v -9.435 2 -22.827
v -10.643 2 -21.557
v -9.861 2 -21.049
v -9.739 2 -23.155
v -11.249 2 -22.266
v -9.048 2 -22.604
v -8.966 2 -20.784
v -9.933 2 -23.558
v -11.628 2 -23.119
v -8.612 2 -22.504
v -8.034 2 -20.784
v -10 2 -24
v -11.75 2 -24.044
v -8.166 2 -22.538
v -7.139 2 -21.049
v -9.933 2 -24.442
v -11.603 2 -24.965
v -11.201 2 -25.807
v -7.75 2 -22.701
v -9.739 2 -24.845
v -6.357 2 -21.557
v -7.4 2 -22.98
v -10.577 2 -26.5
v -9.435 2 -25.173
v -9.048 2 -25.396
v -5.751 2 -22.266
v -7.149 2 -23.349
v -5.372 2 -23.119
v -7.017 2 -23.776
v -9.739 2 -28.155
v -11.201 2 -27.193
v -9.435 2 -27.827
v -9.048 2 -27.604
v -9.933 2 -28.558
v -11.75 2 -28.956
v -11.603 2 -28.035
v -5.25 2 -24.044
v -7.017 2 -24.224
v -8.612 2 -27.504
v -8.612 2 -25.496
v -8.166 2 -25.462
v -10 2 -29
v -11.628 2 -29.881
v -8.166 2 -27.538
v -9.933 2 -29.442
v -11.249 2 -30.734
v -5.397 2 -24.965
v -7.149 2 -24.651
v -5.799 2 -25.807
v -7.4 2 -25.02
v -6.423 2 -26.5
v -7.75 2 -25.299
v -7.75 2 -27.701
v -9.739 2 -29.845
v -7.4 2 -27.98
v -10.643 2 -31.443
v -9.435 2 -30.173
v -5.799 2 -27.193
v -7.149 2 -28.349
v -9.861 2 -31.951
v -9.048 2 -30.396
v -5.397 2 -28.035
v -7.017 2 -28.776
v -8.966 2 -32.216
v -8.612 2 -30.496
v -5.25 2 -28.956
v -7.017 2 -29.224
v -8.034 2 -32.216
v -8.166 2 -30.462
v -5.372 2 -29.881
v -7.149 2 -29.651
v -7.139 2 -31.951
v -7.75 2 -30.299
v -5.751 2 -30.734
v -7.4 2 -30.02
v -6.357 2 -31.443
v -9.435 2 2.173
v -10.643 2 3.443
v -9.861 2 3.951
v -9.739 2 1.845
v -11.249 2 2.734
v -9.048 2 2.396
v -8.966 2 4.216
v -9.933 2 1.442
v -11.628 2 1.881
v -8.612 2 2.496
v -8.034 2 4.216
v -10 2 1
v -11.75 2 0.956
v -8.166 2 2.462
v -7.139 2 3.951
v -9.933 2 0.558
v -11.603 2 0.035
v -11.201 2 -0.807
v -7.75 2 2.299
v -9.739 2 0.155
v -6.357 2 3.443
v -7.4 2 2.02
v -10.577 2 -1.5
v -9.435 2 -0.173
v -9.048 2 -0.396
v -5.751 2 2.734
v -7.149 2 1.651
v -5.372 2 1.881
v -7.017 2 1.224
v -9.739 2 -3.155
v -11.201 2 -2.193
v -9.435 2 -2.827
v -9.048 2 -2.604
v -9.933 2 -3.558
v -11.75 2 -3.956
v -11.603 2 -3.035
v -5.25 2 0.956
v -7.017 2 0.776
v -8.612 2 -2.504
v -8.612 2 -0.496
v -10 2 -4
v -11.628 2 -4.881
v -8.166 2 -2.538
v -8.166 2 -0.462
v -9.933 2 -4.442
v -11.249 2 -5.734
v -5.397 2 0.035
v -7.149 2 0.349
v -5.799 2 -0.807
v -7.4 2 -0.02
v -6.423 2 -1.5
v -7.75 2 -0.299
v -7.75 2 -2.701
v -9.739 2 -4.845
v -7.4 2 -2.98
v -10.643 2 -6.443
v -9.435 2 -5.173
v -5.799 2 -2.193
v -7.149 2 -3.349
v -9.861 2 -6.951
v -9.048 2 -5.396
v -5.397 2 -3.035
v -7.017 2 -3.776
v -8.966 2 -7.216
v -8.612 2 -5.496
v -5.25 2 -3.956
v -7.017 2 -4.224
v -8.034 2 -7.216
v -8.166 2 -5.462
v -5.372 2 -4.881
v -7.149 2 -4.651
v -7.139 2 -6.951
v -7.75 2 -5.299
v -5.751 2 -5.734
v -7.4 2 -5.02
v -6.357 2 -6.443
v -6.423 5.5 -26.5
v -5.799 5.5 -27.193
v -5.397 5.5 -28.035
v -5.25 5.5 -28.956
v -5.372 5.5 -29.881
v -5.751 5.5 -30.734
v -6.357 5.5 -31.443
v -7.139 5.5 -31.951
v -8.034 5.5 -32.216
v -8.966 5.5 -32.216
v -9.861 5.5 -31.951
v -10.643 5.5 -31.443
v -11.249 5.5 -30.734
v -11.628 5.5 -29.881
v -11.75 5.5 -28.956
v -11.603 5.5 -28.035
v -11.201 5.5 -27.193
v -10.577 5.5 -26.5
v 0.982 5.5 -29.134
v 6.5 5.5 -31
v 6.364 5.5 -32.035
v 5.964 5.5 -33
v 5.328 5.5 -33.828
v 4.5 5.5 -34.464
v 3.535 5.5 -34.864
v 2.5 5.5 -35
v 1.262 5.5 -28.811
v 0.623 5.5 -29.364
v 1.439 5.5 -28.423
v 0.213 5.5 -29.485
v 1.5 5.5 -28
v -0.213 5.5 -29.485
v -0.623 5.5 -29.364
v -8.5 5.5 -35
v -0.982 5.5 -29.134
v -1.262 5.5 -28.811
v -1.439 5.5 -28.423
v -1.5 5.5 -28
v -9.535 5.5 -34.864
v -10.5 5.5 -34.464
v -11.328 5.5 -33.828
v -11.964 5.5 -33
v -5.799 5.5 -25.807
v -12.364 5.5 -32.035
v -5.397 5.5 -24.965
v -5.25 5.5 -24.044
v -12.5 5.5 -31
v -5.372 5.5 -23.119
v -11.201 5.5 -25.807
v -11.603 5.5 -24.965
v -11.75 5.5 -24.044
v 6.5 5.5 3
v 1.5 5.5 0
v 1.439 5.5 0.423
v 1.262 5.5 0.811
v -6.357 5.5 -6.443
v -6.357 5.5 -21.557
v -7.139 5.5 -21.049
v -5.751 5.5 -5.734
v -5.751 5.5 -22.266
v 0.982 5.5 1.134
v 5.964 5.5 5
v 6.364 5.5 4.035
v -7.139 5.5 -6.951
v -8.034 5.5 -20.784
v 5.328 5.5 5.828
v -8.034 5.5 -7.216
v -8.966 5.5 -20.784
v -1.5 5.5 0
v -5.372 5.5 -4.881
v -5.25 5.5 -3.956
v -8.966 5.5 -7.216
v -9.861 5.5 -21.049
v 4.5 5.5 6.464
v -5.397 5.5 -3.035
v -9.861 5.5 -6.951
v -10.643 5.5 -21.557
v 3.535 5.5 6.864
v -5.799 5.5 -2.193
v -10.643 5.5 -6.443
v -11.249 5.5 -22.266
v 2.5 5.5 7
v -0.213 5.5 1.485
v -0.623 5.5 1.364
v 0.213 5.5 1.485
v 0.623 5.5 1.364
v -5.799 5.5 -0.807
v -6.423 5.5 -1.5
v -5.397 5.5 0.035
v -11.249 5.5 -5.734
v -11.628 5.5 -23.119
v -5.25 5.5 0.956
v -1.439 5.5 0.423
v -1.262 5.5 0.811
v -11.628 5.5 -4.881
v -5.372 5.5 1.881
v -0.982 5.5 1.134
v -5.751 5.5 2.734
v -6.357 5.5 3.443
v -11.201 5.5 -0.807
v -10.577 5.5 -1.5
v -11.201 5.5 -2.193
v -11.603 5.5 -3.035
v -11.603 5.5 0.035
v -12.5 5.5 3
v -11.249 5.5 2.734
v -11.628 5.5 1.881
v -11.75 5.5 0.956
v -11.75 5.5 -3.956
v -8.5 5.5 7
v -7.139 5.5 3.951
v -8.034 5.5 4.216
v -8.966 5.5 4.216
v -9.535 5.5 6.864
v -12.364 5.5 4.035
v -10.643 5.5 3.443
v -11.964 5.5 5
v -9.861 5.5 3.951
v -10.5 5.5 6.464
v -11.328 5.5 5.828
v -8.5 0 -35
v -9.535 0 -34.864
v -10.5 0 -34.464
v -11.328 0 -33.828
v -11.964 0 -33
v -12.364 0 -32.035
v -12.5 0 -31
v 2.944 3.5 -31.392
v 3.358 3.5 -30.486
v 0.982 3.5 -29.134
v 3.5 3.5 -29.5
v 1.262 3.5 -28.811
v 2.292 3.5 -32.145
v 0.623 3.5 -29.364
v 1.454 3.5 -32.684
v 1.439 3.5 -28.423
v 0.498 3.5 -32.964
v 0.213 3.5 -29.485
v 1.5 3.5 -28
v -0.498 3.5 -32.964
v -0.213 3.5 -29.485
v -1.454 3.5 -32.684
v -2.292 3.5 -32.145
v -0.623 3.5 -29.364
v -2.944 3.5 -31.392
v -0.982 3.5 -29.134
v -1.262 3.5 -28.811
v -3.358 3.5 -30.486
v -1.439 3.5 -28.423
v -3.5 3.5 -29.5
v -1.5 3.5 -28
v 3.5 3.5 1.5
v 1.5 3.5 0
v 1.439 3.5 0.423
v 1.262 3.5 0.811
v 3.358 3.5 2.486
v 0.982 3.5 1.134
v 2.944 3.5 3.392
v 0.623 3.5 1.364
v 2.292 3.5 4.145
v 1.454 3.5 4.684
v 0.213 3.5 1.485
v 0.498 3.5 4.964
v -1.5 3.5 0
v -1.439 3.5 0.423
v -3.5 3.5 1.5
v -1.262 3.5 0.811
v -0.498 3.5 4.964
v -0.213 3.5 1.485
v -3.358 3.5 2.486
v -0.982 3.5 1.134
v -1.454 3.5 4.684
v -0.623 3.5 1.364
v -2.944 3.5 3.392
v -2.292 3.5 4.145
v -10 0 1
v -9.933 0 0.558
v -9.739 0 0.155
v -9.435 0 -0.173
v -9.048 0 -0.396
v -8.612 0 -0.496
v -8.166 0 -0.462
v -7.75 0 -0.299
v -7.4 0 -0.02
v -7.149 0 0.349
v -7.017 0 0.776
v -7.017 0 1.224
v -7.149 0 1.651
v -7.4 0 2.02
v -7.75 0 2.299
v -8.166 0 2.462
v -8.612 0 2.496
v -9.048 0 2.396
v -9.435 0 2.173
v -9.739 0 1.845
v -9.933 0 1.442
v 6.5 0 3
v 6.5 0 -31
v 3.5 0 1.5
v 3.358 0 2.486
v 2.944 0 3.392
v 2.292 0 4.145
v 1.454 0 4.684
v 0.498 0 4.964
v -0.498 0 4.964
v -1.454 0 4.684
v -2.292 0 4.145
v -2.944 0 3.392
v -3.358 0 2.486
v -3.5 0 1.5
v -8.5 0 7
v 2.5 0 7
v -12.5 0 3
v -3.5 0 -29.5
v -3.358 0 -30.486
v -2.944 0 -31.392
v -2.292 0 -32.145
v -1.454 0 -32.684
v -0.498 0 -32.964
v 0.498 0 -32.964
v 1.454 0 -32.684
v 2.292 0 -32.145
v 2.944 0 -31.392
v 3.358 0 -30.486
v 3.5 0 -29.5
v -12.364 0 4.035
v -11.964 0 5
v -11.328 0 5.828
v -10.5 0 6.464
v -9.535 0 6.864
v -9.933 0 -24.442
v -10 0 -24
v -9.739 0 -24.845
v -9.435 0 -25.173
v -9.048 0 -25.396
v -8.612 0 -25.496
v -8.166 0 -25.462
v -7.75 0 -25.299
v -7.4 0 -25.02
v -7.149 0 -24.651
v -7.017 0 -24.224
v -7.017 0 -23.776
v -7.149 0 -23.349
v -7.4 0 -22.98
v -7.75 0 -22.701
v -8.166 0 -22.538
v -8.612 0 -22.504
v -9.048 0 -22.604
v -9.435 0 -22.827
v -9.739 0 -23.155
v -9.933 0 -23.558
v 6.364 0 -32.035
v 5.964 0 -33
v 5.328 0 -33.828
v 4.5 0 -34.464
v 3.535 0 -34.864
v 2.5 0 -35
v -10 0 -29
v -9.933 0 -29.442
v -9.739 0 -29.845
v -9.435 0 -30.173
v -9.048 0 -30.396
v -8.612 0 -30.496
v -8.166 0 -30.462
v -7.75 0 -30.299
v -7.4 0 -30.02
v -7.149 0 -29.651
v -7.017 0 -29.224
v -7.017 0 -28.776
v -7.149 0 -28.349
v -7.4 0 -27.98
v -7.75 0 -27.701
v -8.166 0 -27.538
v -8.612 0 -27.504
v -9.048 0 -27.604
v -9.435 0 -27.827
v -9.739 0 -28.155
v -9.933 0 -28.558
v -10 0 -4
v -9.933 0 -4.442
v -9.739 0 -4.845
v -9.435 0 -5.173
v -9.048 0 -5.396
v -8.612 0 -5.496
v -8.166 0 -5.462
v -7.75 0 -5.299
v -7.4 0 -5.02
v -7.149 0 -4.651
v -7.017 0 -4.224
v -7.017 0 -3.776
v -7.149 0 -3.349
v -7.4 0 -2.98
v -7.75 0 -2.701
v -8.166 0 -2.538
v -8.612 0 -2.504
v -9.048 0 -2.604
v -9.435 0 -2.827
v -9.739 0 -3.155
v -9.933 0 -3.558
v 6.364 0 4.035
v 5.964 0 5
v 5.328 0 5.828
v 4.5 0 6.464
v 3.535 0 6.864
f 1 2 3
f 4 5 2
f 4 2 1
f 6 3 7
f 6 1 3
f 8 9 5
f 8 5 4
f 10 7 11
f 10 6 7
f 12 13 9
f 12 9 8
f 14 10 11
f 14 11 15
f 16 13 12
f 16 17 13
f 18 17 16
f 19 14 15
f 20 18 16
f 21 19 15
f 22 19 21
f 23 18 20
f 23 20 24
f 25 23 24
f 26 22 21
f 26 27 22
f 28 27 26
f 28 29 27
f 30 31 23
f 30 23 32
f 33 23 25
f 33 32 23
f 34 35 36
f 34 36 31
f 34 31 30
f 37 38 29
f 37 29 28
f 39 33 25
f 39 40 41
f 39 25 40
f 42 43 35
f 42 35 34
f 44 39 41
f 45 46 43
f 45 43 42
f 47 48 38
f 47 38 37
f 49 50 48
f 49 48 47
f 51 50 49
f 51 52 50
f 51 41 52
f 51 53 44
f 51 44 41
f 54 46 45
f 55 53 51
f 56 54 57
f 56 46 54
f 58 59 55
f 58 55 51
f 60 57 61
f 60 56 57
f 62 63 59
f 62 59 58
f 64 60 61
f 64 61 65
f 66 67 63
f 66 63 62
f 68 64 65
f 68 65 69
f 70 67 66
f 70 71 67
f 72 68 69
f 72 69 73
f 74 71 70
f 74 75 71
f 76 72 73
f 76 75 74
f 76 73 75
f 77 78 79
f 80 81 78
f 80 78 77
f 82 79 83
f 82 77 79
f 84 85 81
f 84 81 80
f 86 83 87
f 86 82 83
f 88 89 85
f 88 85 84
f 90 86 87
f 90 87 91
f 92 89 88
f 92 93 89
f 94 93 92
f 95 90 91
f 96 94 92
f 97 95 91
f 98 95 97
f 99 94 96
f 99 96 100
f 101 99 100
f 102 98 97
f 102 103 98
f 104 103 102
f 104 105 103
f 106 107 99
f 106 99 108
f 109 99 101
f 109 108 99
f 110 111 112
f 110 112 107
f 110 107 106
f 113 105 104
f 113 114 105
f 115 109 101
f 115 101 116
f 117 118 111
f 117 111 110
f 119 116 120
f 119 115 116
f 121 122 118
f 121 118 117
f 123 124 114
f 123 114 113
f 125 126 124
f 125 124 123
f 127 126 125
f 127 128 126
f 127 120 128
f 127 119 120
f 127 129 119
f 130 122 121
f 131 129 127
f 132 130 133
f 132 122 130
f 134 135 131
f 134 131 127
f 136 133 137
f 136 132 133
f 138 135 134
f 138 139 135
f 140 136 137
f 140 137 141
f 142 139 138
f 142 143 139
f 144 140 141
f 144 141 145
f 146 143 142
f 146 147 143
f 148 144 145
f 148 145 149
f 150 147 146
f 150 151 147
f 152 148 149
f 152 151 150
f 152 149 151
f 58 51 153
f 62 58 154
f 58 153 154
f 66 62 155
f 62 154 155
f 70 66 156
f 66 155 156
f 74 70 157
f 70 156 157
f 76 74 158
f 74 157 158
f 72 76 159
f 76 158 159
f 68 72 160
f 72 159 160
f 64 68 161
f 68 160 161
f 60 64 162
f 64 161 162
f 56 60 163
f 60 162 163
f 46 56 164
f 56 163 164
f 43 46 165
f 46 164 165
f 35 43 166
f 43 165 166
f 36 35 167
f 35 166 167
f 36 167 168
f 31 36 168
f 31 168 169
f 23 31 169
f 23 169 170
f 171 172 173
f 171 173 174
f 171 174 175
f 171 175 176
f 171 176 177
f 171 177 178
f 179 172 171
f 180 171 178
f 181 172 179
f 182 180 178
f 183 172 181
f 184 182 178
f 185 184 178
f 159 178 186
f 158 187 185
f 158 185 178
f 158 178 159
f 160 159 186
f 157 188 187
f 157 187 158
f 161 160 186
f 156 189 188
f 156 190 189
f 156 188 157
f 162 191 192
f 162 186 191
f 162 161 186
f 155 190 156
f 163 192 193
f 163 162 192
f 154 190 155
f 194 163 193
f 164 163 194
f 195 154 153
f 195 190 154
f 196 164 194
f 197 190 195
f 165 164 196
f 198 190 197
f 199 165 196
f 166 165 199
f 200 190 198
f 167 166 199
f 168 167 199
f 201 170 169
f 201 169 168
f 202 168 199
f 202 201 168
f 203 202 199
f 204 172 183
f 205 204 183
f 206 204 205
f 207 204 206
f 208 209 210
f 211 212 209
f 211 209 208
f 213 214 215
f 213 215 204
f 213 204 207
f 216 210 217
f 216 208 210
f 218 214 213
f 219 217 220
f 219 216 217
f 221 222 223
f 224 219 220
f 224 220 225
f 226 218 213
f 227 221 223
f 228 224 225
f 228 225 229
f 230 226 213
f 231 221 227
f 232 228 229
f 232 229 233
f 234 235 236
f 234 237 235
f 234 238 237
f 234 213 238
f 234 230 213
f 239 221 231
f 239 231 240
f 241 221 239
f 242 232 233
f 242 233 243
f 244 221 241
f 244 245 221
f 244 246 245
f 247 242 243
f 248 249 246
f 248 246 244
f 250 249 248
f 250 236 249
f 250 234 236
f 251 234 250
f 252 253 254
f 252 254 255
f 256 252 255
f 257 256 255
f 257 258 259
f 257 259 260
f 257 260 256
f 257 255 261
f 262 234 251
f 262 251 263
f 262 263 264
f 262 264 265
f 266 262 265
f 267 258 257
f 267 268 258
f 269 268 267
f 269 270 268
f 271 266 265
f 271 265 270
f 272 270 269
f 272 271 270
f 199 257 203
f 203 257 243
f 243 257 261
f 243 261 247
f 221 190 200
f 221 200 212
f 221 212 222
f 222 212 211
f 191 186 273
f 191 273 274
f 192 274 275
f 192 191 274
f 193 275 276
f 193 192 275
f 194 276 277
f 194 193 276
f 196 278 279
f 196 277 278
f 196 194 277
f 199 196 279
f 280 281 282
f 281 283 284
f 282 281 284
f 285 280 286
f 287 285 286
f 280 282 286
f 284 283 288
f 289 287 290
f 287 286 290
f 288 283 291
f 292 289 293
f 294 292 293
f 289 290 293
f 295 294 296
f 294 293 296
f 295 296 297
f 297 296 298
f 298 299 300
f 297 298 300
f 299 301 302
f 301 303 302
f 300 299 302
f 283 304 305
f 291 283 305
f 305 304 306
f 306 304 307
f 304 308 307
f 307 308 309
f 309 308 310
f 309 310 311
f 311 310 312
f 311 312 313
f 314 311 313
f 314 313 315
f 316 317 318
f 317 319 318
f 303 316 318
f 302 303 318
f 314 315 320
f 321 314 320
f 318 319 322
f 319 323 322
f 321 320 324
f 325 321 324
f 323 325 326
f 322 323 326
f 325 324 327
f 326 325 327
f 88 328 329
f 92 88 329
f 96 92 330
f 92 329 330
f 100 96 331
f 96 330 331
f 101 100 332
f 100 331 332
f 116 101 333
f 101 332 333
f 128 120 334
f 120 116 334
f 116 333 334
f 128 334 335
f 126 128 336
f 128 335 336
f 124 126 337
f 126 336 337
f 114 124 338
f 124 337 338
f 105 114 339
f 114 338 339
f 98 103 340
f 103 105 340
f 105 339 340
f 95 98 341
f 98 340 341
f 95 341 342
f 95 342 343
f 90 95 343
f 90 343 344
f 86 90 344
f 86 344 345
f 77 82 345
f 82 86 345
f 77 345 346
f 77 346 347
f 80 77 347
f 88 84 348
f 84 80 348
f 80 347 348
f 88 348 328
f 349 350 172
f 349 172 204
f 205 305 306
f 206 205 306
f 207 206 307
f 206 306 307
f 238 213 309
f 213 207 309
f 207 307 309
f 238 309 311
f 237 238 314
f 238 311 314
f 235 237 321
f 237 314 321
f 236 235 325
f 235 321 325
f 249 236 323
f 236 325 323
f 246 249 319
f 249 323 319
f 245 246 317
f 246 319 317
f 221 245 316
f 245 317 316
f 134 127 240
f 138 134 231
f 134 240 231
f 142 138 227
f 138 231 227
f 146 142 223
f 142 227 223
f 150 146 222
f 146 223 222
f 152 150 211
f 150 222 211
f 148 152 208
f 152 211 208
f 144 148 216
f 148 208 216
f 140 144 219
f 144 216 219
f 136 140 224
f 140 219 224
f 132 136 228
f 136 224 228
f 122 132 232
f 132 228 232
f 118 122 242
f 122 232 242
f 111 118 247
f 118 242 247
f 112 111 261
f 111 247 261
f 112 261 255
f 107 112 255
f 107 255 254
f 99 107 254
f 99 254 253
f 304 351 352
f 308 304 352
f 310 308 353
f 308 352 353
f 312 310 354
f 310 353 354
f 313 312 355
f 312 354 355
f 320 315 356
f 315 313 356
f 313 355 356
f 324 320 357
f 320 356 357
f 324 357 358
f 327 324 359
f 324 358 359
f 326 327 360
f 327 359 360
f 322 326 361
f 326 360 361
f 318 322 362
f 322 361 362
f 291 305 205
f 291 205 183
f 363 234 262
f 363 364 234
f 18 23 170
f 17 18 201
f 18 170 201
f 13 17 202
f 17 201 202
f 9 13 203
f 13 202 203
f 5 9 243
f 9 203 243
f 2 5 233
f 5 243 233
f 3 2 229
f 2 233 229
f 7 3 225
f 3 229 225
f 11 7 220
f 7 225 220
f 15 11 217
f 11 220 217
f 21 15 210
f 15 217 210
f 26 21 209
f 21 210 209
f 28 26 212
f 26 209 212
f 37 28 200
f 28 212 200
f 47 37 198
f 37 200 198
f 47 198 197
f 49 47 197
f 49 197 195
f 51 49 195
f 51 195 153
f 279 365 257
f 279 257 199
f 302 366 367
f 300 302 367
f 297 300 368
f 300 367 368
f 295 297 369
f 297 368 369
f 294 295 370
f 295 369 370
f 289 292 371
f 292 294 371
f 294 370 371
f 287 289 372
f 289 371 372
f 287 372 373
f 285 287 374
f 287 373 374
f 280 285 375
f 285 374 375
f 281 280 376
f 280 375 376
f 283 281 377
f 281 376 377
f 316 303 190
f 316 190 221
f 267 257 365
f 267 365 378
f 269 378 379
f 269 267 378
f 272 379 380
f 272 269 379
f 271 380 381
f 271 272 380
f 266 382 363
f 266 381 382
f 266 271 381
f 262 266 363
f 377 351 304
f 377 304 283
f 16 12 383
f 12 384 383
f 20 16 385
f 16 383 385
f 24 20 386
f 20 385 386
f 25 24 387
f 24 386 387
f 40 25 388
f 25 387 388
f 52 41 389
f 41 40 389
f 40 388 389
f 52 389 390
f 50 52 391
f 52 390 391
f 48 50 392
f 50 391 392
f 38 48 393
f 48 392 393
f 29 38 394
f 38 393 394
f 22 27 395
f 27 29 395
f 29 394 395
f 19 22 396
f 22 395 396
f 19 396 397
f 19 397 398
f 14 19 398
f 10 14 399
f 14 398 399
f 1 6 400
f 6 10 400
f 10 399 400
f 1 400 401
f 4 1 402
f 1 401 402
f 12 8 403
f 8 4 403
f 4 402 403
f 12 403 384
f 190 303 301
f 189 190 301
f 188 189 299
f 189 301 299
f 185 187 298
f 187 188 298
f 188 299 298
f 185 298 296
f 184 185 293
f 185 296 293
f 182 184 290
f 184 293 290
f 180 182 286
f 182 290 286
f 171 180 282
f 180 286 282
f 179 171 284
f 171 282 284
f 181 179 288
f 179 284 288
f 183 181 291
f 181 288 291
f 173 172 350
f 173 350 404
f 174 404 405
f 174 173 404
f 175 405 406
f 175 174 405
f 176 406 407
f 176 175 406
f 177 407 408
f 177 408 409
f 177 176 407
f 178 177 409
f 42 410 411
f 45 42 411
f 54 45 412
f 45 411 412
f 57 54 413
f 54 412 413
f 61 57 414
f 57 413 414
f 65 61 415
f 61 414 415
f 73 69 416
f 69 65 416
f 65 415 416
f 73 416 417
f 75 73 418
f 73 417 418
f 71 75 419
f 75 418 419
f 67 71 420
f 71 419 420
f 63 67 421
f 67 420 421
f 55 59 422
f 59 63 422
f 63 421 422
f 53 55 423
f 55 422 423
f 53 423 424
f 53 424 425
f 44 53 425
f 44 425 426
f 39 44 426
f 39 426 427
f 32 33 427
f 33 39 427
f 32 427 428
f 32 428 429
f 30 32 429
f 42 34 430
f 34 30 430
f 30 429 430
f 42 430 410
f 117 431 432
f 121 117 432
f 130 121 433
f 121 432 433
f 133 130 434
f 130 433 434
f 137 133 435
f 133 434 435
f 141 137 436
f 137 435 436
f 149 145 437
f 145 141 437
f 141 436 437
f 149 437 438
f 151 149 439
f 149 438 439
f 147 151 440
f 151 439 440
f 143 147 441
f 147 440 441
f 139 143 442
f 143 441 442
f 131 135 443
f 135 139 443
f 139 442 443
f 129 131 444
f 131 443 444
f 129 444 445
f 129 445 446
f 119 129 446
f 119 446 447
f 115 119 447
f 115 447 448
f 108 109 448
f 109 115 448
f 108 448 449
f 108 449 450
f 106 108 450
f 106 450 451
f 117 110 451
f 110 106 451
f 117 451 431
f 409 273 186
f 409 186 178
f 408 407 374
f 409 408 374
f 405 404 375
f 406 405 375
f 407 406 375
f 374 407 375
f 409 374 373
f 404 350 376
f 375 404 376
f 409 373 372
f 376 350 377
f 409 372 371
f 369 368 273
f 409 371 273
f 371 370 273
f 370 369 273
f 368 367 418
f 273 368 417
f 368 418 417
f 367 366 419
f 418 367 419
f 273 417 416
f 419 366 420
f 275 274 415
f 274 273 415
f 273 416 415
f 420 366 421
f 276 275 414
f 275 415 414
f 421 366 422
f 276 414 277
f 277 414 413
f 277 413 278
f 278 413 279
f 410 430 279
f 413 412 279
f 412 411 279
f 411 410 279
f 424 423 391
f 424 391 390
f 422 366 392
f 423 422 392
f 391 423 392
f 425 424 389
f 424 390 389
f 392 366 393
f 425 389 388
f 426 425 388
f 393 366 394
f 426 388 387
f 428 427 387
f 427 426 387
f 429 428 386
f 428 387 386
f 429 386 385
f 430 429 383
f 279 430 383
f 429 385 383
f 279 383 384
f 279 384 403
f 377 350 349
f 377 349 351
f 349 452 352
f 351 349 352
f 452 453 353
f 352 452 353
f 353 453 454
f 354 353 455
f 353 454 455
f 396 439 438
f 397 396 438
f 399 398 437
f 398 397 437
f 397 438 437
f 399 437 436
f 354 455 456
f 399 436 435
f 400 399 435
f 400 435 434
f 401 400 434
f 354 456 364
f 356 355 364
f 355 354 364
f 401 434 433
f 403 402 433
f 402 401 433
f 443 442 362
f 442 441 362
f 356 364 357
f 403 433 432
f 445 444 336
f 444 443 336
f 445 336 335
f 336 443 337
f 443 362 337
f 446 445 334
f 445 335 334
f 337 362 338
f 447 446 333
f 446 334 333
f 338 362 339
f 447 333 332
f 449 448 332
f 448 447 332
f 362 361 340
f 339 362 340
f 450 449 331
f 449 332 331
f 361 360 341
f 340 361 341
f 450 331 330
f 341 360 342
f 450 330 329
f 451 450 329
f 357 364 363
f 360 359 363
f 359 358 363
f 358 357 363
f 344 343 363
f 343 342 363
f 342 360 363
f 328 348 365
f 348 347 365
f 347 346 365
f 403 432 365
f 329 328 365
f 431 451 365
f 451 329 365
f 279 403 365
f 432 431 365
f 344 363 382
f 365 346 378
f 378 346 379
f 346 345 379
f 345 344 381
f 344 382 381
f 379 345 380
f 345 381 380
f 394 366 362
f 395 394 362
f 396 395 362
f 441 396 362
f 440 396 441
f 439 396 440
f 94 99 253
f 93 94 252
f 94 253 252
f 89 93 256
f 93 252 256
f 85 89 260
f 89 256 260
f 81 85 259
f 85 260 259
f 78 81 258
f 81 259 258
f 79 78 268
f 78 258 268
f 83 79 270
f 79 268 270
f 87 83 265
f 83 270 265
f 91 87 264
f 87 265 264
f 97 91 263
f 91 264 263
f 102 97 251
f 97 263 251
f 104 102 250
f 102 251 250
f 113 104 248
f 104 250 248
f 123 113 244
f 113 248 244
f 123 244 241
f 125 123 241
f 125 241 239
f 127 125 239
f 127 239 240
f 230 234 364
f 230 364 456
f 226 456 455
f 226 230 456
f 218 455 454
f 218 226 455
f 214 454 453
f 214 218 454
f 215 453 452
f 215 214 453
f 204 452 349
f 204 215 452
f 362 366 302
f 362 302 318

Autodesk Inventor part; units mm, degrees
ref_plane "YZ Plane" through (0, 0, 0) normal (1, 0, 0) x (0, 1, 0)
ref_plane "XZ Plane" through (0, 0, 0) normal (0, 1, 0) x (-1, 0, 0)
ref_plane "XY Plane" through (0, 0, 0) normal (0, 0, 1) x (1, 0, 0)
sketch "Sketch1" plane through (0, 0, 0) normal (0, 1, 0) x (-1, 0, 0)
  line L0 (0, 0) -> (0, -28) construction
  line L1 (-1.5, 0) -> (-1.5, -28)
  line L2 (1.5, -28) -> (1.5, 0)
  arc A0 (1.5, 0) -> (-1.5, 0) centre (0, 0) ccw
  arc A1 (-1.5, -28) -> (1.5, -28) centre (0, -28) ccw
  line L3 (-6.5, 7) -> (12.5, 7)
  line L4 (12.5, 7) -> (12.5, -35)
  line L5 (12.5, -35) -> (-6.5, -35)
  line L6 (-6.5, -35) -> (-6.5, 7)
  line L7 (8.5, 7) -> (8.5, -35)
  circle A2 centre (8.5, -4) radius 1.5
  circle A3 centre (8.5, -24) radius 1.5
  line L8 (0, 1.5) -> (0, -29.5) construction
  line L9 (-3.5, 1.5) -> (-3.5, -29.5)
  line L10 (3.5, -29.5) -> (3.5, 1.5)
  arc A4 (3.5, 1.5) -> (-3.5, 1.5) centre (0, 1.5) ccw
  arc A5 (-3.5, -29.5) -> (3.5, -29.5) centre (0, -29.5) ccw
  circle A6 centre (8.5, 1) radius 1.5
  circle A7 centre (8.5, -29) radius 1.5
  point P0 (0, -14)
  point P1 (0, -14)
  dimension "d0" = 28
  dimension "d1" = 3
  dimension "d2" = 5
  dimension "d3" = 21
  dimension "d4" = 21
  dimension "d5" = 11
  dimension "d6" = 4
  dimension "d7" = 10
  dimension "d8" = 10
  dimension "d9" = 3
  dimension "d10" = 3
  dimension "d11" = 3.5
  dimension "d16" = 5
  dimension "d17" = 5
  dimension "d18" = 3
  dimension "d19" = 3
extrude "Extrusion1" add sketch "Sketch1" along normal blind 5.5 contours L3 L7 A6 A2 A3 A7 L5 L6 | L3 L4 L5 L7 A7 A3 A2 A6 | A4 L10 A5 L9
extrude "Extrusion2" cut sketch "Sketch1" along normal blind 3.5 contours A4 L10 A5 L9
fillet "Fillet1" radius 4 4 edges at (-12.5, 2.75, 7) (-12.5, 2.75, -35) (6.5, 2.75, 7) (6.5, 2.75, -35)
sketch "Sketch2" plane through (0, 5.5, 0) normal (0, 1, 0) x (1, 0, 0)
  arc A0 (6.5, 31) -> (2.5, 35) centre (2.5, 31) ccw projected
  line L0 (2.5, 35) -> (-8.5, 35) projected
  arc A1 (-8.5, 35) -> (-12.5, 31) centre (-8.5, 31) ccw projected
  line L1 (-12.5, 31) -> (-12.5, -3) projected
  arc A2 (-12.5, -3) -> (-8.5, -7) centre (-8.5, -3) ccw projected
  line L2 (-8.5, -7) -> (2.5, -7) projected
  arc A3 (2.5, -7) -> (6.5, -3) centre (2.5, -3) ccw projected
  line L3 (6.5, -3) -> (6.5, 31) projected
  circle A4 centre (-8.5, -1) radius 1.5 projected
  circle A5 centre (-8.5, 4) radius 1.5 projected
  circle A6 centre (-8.5, 24) radius 1.5 projected
  circle A7 centre (-8.5, 29) radius 1.5 projected
  arc A8 (-1.5, 0) -> (1.5, 0) centre (0, 0) ccw projected
  line L4 (-1.5, 0) -> (-1.5, 28) projected
  arc A9 (1.5, 28) -> (-1.5, 28) centre (0, 28) ccw projected
  line L5 (1.5, 28) -> (1.5, 0) projected
  circle A10 centre (-8.5, -1) radius 3.25
  circle A11 centre (-8.5, 4) radius 3.25
  circle A12 centre (-8.5, 24) radius 3.25
  circle A13 centre (-8.5, 29) radius 3.25
  point P0 (-6.4233, 1.5)
  point P1 (-10.5767, 1.5)
  point P2 (-10.5767, 26.5)
  point P3 (-6.4233, 26.5)
  dimension "d21" = 6.5
  dimension "d22" = 6.5
  dimension "d23" = 6.5
  dimension "d24" = 6.5
extrude "Extrusion3" cut sketch "Sketch2" against normal blind 3.5 contours A10 A11 | A11 A10 | A10 A11 | A12 A13 | A13 A12 | A12 A13
properties part number "EStopHolder"
